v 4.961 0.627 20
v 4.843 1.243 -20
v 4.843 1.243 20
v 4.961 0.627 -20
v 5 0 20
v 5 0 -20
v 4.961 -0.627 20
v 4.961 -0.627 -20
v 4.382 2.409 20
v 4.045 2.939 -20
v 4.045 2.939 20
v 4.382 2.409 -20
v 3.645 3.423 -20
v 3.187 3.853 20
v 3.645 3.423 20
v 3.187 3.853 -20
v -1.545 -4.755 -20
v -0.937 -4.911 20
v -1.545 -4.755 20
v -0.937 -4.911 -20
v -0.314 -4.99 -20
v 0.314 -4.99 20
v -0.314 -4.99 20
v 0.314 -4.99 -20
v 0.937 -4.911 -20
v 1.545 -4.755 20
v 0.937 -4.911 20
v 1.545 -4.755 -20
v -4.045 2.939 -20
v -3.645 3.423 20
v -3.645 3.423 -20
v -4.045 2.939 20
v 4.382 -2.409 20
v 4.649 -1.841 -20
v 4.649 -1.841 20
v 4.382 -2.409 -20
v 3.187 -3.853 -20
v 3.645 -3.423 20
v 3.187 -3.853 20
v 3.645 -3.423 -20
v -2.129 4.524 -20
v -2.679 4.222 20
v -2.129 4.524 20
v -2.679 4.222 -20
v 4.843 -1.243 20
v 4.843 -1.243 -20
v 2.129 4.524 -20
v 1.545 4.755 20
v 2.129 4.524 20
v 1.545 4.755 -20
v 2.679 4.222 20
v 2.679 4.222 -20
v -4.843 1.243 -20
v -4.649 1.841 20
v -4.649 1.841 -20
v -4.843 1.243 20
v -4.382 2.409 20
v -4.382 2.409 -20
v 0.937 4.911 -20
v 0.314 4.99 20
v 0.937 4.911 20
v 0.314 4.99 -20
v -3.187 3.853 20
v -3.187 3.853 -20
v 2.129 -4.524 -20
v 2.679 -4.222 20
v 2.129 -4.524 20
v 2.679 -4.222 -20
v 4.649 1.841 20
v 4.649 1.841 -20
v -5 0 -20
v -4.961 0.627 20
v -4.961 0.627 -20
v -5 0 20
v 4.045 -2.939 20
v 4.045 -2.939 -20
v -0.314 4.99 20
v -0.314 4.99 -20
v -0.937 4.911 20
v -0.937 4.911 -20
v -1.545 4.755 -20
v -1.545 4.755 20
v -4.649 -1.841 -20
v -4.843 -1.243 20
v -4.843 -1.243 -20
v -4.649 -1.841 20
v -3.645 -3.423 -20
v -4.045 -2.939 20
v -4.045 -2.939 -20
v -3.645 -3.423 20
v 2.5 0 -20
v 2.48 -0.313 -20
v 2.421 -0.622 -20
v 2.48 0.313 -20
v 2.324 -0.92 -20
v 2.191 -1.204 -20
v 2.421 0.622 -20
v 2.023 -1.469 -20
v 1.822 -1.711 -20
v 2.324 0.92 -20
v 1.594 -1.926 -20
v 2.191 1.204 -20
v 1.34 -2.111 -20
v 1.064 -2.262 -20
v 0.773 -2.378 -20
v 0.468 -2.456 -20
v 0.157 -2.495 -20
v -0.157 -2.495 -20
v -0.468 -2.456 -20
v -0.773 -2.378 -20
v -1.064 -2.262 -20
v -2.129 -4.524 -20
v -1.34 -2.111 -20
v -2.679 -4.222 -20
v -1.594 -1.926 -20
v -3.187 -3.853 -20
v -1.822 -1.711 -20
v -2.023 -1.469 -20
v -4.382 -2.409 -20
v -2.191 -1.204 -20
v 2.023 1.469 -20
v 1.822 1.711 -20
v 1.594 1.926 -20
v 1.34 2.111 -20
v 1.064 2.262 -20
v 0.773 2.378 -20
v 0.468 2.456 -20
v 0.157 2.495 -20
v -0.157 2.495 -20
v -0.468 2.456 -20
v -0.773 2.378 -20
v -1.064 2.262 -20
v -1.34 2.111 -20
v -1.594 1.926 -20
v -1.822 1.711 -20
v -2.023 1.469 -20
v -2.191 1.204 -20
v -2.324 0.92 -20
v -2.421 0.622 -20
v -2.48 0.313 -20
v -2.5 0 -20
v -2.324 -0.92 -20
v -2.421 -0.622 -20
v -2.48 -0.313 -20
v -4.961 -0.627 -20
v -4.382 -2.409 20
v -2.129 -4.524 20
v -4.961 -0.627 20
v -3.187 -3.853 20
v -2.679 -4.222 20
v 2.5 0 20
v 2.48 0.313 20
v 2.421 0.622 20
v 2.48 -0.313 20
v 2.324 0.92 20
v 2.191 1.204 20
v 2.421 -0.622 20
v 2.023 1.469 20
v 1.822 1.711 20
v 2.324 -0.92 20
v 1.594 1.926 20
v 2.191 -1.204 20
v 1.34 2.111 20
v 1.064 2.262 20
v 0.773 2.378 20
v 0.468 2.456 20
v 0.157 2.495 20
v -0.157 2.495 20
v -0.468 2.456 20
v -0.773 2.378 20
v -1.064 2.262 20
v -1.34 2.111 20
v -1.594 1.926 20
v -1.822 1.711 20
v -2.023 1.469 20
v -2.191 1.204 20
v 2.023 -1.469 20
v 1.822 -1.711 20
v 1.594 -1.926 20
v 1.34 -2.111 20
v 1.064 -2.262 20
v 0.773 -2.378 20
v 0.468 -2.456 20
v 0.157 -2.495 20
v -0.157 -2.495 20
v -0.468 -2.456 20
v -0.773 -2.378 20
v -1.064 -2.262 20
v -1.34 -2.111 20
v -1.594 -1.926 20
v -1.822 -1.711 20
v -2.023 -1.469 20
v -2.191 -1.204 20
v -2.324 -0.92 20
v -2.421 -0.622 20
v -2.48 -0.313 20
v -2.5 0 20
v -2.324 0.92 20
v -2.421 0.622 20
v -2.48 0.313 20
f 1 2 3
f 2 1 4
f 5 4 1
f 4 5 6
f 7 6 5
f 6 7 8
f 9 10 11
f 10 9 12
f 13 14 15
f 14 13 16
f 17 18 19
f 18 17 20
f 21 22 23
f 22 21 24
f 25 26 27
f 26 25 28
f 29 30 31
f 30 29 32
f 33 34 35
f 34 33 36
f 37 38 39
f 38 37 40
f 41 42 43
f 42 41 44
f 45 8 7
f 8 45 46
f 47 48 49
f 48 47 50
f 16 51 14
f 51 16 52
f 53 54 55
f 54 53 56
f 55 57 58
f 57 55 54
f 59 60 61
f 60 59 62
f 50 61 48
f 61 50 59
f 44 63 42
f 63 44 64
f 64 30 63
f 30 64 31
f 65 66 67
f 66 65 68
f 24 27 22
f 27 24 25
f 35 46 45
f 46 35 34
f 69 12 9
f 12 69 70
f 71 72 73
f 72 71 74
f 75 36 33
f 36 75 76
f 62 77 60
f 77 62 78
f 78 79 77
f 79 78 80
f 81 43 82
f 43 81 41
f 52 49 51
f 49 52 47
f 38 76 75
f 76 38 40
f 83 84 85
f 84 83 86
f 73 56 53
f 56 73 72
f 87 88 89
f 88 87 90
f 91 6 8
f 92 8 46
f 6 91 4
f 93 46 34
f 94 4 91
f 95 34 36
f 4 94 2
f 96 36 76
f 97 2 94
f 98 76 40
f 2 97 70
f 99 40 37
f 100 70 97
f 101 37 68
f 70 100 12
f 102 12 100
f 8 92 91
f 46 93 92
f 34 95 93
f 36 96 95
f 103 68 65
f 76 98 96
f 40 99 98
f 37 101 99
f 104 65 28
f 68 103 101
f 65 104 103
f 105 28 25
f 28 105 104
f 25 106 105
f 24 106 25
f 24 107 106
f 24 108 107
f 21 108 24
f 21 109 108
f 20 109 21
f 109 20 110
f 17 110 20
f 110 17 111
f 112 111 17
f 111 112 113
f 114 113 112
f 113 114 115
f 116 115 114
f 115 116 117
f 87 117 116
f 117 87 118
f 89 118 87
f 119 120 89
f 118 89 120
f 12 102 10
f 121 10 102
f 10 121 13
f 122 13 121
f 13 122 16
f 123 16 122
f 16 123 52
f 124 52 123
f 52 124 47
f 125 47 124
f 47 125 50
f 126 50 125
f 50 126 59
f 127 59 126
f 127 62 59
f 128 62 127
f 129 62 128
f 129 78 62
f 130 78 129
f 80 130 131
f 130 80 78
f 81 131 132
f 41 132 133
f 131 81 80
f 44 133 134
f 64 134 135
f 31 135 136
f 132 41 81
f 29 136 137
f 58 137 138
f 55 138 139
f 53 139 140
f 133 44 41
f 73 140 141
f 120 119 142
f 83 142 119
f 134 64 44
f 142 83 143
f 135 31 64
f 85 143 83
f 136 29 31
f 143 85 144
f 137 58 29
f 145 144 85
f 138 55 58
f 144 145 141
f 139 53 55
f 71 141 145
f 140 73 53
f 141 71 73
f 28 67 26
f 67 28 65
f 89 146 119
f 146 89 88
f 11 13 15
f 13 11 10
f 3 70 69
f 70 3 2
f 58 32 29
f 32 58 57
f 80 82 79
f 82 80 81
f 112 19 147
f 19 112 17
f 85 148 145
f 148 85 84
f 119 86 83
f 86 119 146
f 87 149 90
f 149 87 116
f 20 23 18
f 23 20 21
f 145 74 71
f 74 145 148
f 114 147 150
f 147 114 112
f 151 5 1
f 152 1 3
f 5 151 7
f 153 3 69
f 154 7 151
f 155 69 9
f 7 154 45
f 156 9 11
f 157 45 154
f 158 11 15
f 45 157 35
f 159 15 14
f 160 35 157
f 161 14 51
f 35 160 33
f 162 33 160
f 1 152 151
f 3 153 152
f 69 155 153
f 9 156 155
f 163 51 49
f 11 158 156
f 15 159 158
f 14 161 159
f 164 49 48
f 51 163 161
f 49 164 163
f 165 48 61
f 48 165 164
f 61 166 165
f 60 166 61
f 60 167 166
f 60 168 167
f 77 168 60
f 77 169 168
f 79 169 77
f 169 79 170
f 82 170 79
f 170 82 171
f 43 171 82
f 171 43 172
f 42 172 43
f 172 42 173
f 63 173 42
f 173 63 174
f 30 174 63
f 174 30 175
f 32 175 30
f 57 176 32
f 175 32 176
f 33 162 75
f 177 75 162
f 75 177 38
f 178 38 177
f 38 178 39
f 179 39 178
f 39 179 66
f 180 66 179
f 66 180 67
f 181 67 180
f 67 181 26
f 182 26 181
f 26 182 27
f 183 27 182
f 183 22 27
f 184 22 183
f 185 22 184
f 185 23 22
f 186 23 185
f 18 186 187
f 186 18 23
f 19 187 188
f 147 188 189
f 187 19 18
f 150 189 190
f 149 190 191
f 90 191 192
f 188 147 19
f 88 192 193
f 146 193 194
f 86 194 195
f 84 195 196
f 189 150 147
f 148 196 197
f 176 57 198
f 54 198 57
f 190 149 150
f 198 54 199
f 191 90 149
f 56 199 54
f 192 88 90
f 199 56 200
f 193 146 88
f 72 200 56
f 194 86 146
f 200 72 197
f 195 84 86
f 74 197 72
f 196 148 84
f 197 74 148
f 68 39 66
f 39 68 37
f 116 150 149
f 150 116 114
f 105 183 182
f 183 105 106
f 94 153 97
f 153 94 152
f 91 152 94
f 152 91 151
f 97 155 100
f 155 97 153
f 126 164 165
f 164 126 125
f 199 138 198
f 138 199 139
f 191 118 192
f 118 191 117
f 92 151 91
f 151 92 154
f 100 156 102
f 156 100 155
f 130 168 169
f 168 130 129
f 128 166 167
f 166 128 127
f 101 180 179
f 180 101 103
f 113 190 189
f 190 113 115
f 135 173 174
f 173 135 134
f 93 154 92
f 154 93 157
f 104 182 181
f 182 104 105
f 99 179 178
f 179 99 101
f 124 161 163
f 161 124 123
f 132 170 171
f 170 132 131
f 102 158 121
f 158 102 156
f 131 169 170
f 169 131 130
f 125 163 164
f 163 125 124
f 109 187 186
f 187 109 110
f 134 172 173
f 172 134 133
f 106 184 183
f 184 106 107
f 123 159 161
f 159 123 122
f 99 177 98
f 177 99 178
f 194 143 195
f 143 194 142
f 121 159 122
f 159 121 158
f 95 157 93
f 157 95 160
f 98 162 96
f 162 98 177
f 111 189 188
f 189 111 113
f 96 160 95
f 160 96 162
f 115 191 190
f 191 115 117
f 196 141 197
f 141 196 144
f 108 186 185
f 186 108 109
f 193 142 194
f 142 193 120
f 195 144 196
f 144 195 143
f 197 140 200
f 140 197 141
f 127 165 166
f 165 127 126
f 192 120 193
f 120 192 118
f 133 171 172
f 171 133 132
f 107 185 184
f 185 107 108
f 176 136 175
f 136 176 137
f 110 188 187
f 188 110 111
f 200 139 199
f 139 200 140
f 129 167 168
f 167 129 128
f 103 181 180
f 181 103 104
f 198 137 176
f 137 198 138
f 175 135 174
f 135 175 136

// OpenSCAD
$fn = 50;


difference() {
	union() {
		translate(v = [0, 0, -20.0000000000]) {
			cylinder(h = 40, r = 5.0000000000);
		}
	}
	union() {
		translate(v = [0, 0, -100.0000000000]) {
			cylinder(h = 200, r = 2.5000000000);
		}
	}
}
